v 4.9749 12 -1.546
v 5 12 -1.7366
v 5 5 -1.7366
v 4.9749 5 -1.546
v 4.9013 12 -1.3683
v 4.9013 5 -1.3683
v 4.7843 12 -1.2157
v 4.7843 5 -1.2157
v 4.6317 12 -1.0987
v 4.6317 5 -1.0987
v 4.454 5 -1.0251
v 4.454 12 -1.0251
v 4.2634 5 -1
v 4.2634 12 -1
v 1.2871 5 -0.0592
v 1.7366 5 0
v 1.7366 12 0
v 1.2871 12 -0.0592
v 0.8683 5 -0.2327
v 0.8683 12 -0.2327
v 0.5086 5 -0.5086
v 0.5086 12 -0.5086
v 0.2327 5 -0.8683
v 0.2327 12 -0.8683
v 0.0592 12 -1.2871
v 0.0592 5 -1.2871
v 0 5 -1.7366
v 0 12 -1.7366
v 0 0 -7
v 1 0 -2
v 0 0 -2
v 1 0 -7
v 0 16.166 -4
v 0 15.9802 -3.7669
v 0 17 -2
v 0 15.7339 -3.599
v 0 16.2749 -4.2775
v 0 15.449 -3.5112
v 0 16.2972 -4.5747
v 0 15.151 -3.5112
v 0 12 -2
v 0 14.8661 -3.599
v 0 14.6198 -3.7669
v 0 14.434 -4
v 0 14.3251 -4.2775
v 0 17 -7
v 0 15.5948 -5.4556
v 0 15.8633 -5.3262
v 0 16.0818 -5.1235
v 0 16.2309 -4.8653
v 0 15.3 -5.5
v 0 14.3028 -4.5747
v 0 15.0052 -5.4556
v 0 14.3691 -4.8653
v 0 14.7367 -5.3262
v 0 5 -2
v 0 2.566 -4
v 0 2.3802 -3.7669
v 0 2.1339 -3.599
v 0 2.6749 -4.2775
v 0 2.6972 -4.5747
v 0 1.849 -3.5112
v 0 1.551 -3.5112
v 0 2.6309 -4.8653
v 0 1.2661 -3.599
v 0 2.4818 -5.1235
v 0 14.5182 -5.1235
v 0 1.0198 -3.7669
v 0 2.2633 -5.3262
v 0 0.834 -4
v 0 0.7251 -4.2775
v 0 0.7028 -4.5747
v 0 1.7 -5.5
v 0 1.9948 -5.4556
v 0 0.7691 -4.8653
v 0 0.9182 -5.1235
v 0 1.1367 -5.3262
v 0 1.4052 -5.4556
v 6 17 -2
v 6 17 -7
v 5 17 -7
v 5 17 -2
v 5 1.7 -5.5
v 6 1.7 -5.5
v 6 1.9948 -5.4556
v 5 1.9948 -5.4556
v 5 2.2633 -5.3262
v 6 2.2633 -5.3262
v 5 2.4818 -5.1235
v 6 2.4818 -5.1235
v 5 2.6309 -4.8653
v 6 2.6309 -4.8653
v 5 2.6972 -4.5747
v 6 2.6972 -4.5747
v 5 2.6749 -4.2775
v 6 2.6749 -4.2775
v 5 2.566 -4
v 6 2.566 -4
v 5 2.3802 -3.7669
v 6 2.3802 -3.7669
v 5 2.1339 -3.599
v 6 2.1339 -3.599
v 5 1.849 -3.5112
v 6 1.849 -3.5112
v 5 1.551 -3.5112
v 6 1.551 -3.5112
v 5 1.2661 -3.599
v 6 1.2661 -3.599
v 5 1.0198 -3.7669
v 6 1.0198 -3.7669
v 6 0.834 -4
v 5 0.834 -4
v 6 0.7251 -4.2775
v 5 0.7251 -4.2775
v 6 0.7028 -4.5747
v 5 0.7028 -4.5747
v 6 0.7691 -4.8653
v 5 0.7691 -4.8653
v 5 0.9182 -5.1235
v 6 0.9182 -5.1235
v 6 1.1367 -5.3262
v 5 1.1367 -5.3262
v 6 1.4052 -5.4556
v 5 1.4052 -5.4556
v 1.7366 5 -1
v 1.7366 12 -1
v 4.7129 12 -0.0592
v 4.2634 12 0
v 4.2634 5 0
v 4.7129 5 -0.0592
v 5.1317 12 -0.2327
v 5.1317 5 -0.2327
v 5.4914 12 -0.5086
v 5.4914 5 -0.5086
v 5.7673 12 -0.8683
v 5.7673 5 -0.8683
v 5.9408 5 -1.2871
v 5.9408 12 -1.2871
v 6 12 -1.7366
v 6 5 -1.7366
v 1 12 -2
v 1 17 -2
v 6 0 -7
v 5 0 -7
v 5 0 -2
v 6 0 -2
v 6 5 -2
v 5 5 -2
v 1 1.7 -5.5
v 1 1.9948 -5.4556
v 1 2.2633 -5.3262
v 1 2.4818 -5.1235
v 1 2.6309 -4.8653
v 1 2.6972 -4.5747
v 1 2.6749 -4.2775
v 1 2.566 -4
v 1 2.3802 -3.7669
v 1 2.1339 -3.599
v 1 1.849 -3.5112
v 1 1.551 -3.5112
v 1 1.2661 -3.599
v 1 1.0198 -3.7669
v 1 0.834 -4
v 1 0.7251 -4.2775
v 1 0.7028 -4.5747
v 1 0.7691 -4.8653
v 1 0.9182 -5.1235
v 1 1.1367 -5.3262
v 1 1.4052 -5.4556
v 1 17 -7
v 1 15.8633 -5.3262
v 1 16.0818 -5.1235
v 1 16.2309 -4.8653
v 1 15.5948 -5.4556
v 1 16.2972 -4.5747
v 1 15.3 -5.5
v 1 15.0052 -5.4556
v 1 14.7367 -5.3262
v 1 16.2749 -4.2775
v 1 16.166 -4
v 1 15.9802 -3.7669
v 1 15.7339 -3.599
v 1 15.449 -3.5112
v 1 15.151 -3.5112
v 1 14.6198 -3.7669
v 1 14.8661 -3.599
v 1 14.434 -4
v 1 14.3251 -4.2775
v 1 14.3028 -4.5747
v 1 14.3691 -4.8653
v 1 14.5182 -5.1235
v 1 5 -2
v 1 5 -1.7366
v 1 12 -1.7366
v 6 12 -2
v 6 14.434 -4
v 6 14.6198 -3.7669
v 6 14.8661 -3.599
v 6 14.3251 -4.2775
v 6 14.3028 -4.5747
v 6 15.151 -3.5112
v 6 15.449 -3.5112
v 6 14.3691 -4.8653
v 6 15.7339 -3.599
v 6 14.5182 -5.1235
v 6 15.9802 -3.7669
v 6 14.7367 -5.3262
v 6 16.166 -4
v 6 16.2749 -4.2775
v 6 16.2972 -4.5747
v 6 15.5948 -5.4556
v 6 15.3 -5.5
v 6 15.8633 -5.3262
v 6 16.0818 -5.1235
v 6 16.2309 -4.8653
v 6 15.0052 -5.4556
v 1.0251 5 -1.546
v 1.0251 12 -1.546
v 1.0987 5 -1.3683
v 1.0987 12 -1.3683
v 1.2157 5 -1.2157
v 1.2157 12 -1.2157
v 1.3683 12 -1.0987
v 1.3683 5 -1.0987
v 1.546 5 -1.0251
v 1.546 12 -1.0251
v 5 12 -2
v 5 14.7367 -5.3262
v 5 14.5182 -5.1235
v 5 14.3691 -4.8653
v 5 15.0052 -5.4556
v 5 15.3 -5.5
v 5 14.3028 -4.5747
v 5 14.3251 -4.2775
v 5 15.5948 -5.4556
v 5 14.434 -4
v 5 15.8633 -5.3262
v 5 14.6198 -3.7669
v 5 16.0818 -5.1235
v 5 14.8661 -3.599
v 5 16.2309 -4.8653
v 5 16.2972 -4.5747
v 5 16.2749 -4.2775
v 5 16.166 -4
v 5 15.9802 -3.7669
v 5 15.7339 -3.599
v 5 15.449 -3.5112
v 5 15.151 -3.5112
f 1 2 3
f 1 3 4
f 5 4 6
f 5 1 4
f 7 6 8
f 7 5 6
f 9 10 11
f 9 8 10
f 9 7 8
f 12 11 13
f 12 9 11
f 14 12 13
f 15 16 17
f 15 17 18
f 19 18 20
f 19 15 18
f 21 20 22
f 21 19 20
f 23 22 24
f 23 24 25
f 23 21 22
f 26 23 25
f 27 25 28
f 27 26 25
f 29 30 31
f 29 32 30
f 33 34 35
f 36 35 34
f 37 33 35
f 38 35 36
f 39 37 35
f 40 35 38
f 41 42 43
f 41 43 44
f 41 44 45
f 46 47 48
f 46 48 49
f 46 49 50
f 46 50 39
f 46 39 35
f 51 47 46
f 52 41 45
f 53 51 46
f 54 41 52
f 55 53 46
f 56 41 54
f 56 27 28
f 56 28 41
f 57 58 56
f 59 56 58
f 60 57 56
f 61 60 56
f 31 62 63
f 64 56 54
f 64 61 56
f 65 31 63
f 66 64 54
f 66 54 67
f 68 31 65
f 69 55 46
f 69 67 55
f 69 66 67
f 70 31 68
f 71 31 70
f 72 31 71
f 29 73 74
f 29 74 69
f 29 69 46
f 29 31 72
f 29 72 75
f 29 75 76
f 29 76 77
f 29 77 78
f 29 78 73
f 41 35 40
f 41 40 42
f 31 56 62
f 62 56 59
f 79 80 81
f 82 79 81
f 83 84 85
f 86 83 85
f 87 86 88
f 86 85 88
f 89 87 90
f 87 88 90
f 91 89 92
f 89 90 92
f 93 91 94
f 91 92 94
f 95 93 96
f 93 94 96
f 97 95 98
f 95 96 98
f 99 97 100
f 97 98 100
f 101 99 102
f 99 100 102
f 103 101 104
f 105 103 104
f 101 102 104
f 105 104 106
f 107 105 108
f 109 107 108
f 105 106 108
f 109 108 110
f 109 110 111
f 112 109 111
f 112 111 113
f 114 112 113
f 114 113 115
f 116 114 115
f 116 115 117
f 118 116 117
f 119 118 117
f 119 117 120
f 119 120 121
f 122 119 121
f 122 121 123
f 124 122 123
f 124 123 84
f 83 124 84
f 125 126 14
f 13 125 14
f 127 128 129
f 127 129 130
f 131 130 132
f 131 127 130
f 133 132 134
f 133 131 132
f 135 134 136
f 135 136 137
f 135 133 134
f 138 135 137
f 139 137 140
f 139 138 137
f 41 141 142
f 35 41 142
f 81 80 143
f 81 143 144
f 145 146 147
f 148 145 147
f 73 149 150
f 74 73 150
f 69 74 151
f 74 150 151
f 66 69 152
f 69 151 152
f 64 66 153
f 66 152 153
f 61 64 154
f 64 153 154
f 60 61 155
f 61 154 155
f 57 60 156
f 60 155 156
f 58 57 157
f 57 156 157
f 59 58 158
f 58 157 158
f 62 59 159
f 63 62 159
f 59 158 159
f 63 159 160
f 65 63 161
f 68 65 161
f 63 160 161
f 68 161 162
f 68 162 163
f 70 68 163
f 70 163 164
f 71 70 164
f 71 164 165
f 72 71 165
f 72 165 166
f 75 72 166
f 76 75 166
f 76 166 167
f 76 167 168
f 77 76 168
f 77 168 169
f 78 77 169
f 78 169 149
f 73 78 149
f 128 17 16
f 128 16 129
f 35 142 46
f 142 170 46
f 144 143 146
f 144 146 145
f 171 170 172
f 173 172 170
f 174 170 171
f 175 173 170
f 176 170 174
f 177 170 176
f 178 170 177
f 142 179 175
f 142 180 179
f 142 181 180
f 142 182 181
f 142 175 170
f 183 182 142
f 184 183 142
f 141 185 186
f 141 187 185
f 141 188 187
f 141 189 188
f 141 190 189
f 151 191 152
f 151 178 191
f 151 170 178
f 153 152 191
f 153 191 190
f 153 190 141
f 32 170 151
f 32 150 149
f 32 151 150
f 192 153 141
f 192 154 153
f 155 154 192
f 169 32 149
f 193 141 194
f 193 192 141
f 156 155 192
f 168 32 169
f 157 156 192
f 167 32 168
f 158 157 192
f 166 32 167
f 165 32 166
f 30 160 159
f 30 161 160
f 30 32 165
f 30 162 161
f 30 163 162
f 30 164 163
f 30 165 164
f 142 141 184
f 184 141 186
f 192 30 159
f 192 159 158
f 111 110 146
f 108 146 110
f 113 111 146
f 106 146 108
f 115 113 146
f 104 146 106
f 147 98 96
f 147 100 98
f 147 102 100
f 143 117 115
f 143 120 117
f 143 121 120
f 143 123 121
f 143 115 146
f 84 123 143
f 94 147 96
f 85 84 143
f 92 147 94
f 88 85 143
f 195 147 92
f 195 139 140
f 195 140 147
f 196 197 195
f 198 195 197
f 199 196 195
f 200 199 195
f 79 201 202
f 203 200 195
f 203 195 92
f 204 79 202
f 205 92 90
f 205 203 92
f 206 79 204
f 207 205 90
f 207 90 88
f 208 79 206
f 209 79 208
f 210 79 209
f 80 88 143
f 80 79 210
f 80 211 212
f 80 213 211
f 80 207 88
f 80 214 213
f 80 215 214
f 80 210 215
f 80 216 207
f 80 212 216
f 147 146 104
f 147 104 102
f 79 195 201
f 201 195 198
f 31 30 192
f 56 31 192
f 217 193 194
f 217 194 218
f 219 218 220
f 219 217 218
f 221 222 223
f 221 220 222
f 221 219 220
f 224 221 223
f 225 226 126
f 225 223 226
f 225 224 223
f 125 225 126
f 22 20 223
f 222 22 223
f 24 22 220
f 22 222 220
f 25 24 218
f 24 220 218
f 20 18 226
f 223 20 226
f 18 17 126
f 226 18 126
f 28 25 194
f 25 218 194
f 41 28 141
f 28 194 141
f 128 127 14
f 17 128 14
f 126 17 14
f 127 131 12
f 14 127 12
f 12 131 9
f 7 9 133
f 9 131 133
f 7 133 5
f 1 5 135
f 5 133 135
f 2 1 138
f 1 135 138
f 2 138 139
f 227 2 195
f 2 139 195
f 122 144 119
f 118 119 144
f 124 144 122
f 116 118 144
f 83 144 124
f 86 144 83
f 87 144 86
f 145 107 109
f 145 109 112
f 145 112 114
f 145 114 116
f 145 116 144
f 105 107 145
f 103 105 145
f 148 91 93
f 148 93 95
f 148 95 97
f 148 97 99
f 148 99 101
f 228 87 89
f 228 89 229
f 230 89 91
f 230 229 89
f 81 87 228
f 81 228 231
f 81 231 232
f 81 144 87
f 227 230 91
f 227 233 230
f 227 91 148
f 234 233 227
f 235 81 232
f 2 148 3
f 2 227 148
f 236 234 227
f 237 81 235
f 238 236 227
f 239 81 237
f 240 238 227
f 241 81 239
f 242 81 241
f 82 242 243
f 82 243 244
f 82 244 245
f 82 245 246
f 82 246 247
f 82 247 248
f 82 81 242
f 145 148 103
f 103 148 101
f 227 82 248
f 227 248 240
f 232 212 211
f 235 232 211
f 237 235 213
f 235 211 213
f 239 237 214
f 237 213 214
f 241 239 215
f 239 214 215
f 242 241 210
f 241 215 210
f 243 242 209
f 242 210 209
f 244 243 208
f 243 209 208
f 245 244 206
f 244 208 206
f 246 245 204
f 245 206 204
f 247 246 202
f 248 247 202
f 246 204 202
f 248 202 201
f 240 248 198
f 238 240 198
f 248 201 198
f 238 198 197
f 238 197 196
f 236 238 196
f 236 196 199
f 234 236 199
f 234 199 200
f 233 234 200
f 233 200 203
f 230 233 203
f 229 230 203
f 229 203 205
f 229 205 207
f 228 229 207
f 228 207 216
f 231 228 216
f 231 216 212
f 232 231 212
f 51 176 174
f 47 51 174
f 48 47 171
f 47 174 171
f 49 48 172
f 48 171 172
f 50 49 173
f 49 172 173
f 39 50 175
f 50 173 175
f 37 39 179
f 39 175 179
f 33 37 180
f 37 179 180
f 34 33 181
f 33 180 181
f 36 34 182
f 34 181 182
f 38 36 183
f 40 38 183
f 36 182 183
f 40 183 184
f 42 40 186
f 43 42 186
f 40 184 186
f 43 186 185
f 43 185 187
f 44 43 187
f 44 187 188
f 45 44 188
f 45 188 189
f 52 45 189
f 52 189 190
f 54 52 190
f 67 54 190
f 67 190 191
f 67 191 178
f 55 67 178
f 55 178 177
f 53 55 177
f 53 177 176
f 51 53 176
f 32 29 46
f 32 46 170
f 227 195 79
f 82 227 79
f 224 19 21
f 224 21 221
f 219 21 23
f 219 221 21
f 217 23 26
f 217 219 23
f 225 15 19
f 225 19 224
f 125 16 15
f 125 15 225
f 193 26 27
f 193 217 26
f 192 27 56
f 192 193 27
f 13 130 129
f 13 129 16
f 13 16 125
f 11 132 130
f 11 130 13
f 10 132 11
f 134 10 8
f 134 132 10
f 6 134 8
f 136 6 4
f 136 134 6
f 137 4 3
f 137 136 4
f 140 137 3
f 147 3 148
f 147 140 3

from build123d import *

# Parameters (mm, degrees)
CROQUIS1_W                         = 6
CROQUIS1_H                         = 17
BRIDA_BASE1_DEPTH                  = 1
BRIDA_DE_ARISTA1_STRIP_W           = 5.4732
BRIDA_DE_ARISTA1_STRIP_H           = 1
BRIDA_DE_ARISTA1_STRIP_CUT_DEPTH   = 17
BRIDA_DE_ARISTA1_STRIP_2_W         = 5.4732
BRIDA_DE_ARISTA1_STRIP_2_H         = 1
BRIDA_DE_ARISTA1_STRIP_CUT_2_DEPTH = 17
BRIDA_DE_ARISTA1_DEPTH             = 17
BRIDA_DE_ARISTA1_BEND_DEPTH        = 17
CROQUIS12_W                        = 2
CROQUIS12_H                        = 5
CORTAR_EXTRUIR1_DEPTH              = 10
CROQUIS13_R                        = 1
CORTAR_EXTRUIR2_DEPTH              = 10


# Sheet-metal steps are written as plain solids
with BuildPart() as part:
    # Croquis1 → Brida base1 (new body)
    with BuildSketch(Plane.XY):
        with Locations((3, 8.5)):
            Rectangle(CROQUIS1_W, CROQUIS1_H)
    extrude(amount=-BRIDA_BASE1_DEPTH)

    # Brida de arista1 strip (across the edge) → Brida de arista1 strip cut (cut)
    with BuildSketch(Plane(origin=(6, 17, -1), x_dir=(-1, 0, 0), z_dir=(0, -1, 0))):
        with Locations((-1, -0.5)):
            Rectangle(BRIDA_DE_ARISTA1_STRIP_W, BRIDA_DE_ARISTA1_STRIP_H)
    extrude(amount=BRIDA_DE_ARISTA1_STRIP_CUT_DEPTH, mode=Mode.SUBTRACT)

    # Brida de arista1 strip 2 (across the edge) → Brida de arista1 strip cut 2 (cut)
    with BuildSketch(Plane(origin=(0, 0, -1), x_dir=(1, 0, 0), z_dir=(0, 1, 0))):
        with Locations((-1, -0.5)):
            Rectangle(BRIDA_DE_ARISTA1_STRIP_2_W, BRIDA_DE_ARISTA1_STRIP_2_H)
    extrude(amount=BRIDA_DE_ARISTA1_STRIP_CUT_2_DEPTH, mode=Mode.SUBTRACT)

    # Brida de arista1 section (across the edge) → Brida de arista1 (add)
    with BuildSketch(Plane(origin=(6, 17, -1), x_dir=(-1, 0, 0), z_dir=(0, -1, 0))):
        with BuildLine():
            Line((0, 0.7366), (0, 6))
            Line((0, 6), (1, 6))
            Line((1, 6), (1, 0.7366))
            ThreePointArc((1, 0.7366), (1.215745145, 0.215745145), (1.7366, 0))
            Line((1.7366, 0), (1.7366, -1))
            ThreePointArc((1.7366, -1), (0.508638364, -0.491361636), (0, 0.7366))
        make_face()
    extrude(amount=BRIDA_DE_ARISTA1_DEPTH)

    # Brida de arista1 section 2 (across the edge) → Brida de arista1 bend (add)
    with BuildSketch(Plane(origin=(0, 0, -1), x_dir=(1, 0, 0), z_dir=(0, 1, 0))):
        with BuildLine():
            Line((0, 0.7366), (0, 6))
            Line((0, 6), (1, 6))
            Line((1, 6), (1, 0.7366))
            ThreePointArc((1, 0.7366), (1.215745145, 0.215745145), (1.7366, 0))
            Line((1.7366, 0), (1.7366, -1))
            ThreePointArc((1.7366, -1), (0.508638364, -0.491361636), (0, 0.7366))
        make_face()
    extrude(amount=BRIDA_DE_ARISTA1_BEND_DEPTH)

    # Croquis12 → Cortar-Extruir1 (cut)
    with BuildSketch(Plane(origin=(6, 0, 0), x_dir=(0, 0, -1), z_dir=(1, 0, 0))):
        with Locations((1, 14.5)):
            Rectangle(CROQUIS12_W, CROQUIS12_H)
        with Locations((1, 2.5)):
            Rectangle(CROQUIS12_W, CROQUIS12_H)
    extrude(amount=-CORTAR_EXTRUIR1_DEPTH, mode=Mode.SUBTRACT)

    # Croquis13 → Cortar-Extruir2 (cut)
    with BuildSketch(Plane(origin=(6, 0, 0), x_dir=(0, 0, -1), z_dir=(1, 0, 0))):
        with Locations((4.5, 15.3)):
            Circle(CROQUIS13_R)
        with Locations((4.5, 1.7)):
            Circle(CROQUIS13_R)
    extrude(amount=-CORTAR_EXTRUIR2_DEPTH, mode=Mode.SUBTRACT)


solid = part.part
